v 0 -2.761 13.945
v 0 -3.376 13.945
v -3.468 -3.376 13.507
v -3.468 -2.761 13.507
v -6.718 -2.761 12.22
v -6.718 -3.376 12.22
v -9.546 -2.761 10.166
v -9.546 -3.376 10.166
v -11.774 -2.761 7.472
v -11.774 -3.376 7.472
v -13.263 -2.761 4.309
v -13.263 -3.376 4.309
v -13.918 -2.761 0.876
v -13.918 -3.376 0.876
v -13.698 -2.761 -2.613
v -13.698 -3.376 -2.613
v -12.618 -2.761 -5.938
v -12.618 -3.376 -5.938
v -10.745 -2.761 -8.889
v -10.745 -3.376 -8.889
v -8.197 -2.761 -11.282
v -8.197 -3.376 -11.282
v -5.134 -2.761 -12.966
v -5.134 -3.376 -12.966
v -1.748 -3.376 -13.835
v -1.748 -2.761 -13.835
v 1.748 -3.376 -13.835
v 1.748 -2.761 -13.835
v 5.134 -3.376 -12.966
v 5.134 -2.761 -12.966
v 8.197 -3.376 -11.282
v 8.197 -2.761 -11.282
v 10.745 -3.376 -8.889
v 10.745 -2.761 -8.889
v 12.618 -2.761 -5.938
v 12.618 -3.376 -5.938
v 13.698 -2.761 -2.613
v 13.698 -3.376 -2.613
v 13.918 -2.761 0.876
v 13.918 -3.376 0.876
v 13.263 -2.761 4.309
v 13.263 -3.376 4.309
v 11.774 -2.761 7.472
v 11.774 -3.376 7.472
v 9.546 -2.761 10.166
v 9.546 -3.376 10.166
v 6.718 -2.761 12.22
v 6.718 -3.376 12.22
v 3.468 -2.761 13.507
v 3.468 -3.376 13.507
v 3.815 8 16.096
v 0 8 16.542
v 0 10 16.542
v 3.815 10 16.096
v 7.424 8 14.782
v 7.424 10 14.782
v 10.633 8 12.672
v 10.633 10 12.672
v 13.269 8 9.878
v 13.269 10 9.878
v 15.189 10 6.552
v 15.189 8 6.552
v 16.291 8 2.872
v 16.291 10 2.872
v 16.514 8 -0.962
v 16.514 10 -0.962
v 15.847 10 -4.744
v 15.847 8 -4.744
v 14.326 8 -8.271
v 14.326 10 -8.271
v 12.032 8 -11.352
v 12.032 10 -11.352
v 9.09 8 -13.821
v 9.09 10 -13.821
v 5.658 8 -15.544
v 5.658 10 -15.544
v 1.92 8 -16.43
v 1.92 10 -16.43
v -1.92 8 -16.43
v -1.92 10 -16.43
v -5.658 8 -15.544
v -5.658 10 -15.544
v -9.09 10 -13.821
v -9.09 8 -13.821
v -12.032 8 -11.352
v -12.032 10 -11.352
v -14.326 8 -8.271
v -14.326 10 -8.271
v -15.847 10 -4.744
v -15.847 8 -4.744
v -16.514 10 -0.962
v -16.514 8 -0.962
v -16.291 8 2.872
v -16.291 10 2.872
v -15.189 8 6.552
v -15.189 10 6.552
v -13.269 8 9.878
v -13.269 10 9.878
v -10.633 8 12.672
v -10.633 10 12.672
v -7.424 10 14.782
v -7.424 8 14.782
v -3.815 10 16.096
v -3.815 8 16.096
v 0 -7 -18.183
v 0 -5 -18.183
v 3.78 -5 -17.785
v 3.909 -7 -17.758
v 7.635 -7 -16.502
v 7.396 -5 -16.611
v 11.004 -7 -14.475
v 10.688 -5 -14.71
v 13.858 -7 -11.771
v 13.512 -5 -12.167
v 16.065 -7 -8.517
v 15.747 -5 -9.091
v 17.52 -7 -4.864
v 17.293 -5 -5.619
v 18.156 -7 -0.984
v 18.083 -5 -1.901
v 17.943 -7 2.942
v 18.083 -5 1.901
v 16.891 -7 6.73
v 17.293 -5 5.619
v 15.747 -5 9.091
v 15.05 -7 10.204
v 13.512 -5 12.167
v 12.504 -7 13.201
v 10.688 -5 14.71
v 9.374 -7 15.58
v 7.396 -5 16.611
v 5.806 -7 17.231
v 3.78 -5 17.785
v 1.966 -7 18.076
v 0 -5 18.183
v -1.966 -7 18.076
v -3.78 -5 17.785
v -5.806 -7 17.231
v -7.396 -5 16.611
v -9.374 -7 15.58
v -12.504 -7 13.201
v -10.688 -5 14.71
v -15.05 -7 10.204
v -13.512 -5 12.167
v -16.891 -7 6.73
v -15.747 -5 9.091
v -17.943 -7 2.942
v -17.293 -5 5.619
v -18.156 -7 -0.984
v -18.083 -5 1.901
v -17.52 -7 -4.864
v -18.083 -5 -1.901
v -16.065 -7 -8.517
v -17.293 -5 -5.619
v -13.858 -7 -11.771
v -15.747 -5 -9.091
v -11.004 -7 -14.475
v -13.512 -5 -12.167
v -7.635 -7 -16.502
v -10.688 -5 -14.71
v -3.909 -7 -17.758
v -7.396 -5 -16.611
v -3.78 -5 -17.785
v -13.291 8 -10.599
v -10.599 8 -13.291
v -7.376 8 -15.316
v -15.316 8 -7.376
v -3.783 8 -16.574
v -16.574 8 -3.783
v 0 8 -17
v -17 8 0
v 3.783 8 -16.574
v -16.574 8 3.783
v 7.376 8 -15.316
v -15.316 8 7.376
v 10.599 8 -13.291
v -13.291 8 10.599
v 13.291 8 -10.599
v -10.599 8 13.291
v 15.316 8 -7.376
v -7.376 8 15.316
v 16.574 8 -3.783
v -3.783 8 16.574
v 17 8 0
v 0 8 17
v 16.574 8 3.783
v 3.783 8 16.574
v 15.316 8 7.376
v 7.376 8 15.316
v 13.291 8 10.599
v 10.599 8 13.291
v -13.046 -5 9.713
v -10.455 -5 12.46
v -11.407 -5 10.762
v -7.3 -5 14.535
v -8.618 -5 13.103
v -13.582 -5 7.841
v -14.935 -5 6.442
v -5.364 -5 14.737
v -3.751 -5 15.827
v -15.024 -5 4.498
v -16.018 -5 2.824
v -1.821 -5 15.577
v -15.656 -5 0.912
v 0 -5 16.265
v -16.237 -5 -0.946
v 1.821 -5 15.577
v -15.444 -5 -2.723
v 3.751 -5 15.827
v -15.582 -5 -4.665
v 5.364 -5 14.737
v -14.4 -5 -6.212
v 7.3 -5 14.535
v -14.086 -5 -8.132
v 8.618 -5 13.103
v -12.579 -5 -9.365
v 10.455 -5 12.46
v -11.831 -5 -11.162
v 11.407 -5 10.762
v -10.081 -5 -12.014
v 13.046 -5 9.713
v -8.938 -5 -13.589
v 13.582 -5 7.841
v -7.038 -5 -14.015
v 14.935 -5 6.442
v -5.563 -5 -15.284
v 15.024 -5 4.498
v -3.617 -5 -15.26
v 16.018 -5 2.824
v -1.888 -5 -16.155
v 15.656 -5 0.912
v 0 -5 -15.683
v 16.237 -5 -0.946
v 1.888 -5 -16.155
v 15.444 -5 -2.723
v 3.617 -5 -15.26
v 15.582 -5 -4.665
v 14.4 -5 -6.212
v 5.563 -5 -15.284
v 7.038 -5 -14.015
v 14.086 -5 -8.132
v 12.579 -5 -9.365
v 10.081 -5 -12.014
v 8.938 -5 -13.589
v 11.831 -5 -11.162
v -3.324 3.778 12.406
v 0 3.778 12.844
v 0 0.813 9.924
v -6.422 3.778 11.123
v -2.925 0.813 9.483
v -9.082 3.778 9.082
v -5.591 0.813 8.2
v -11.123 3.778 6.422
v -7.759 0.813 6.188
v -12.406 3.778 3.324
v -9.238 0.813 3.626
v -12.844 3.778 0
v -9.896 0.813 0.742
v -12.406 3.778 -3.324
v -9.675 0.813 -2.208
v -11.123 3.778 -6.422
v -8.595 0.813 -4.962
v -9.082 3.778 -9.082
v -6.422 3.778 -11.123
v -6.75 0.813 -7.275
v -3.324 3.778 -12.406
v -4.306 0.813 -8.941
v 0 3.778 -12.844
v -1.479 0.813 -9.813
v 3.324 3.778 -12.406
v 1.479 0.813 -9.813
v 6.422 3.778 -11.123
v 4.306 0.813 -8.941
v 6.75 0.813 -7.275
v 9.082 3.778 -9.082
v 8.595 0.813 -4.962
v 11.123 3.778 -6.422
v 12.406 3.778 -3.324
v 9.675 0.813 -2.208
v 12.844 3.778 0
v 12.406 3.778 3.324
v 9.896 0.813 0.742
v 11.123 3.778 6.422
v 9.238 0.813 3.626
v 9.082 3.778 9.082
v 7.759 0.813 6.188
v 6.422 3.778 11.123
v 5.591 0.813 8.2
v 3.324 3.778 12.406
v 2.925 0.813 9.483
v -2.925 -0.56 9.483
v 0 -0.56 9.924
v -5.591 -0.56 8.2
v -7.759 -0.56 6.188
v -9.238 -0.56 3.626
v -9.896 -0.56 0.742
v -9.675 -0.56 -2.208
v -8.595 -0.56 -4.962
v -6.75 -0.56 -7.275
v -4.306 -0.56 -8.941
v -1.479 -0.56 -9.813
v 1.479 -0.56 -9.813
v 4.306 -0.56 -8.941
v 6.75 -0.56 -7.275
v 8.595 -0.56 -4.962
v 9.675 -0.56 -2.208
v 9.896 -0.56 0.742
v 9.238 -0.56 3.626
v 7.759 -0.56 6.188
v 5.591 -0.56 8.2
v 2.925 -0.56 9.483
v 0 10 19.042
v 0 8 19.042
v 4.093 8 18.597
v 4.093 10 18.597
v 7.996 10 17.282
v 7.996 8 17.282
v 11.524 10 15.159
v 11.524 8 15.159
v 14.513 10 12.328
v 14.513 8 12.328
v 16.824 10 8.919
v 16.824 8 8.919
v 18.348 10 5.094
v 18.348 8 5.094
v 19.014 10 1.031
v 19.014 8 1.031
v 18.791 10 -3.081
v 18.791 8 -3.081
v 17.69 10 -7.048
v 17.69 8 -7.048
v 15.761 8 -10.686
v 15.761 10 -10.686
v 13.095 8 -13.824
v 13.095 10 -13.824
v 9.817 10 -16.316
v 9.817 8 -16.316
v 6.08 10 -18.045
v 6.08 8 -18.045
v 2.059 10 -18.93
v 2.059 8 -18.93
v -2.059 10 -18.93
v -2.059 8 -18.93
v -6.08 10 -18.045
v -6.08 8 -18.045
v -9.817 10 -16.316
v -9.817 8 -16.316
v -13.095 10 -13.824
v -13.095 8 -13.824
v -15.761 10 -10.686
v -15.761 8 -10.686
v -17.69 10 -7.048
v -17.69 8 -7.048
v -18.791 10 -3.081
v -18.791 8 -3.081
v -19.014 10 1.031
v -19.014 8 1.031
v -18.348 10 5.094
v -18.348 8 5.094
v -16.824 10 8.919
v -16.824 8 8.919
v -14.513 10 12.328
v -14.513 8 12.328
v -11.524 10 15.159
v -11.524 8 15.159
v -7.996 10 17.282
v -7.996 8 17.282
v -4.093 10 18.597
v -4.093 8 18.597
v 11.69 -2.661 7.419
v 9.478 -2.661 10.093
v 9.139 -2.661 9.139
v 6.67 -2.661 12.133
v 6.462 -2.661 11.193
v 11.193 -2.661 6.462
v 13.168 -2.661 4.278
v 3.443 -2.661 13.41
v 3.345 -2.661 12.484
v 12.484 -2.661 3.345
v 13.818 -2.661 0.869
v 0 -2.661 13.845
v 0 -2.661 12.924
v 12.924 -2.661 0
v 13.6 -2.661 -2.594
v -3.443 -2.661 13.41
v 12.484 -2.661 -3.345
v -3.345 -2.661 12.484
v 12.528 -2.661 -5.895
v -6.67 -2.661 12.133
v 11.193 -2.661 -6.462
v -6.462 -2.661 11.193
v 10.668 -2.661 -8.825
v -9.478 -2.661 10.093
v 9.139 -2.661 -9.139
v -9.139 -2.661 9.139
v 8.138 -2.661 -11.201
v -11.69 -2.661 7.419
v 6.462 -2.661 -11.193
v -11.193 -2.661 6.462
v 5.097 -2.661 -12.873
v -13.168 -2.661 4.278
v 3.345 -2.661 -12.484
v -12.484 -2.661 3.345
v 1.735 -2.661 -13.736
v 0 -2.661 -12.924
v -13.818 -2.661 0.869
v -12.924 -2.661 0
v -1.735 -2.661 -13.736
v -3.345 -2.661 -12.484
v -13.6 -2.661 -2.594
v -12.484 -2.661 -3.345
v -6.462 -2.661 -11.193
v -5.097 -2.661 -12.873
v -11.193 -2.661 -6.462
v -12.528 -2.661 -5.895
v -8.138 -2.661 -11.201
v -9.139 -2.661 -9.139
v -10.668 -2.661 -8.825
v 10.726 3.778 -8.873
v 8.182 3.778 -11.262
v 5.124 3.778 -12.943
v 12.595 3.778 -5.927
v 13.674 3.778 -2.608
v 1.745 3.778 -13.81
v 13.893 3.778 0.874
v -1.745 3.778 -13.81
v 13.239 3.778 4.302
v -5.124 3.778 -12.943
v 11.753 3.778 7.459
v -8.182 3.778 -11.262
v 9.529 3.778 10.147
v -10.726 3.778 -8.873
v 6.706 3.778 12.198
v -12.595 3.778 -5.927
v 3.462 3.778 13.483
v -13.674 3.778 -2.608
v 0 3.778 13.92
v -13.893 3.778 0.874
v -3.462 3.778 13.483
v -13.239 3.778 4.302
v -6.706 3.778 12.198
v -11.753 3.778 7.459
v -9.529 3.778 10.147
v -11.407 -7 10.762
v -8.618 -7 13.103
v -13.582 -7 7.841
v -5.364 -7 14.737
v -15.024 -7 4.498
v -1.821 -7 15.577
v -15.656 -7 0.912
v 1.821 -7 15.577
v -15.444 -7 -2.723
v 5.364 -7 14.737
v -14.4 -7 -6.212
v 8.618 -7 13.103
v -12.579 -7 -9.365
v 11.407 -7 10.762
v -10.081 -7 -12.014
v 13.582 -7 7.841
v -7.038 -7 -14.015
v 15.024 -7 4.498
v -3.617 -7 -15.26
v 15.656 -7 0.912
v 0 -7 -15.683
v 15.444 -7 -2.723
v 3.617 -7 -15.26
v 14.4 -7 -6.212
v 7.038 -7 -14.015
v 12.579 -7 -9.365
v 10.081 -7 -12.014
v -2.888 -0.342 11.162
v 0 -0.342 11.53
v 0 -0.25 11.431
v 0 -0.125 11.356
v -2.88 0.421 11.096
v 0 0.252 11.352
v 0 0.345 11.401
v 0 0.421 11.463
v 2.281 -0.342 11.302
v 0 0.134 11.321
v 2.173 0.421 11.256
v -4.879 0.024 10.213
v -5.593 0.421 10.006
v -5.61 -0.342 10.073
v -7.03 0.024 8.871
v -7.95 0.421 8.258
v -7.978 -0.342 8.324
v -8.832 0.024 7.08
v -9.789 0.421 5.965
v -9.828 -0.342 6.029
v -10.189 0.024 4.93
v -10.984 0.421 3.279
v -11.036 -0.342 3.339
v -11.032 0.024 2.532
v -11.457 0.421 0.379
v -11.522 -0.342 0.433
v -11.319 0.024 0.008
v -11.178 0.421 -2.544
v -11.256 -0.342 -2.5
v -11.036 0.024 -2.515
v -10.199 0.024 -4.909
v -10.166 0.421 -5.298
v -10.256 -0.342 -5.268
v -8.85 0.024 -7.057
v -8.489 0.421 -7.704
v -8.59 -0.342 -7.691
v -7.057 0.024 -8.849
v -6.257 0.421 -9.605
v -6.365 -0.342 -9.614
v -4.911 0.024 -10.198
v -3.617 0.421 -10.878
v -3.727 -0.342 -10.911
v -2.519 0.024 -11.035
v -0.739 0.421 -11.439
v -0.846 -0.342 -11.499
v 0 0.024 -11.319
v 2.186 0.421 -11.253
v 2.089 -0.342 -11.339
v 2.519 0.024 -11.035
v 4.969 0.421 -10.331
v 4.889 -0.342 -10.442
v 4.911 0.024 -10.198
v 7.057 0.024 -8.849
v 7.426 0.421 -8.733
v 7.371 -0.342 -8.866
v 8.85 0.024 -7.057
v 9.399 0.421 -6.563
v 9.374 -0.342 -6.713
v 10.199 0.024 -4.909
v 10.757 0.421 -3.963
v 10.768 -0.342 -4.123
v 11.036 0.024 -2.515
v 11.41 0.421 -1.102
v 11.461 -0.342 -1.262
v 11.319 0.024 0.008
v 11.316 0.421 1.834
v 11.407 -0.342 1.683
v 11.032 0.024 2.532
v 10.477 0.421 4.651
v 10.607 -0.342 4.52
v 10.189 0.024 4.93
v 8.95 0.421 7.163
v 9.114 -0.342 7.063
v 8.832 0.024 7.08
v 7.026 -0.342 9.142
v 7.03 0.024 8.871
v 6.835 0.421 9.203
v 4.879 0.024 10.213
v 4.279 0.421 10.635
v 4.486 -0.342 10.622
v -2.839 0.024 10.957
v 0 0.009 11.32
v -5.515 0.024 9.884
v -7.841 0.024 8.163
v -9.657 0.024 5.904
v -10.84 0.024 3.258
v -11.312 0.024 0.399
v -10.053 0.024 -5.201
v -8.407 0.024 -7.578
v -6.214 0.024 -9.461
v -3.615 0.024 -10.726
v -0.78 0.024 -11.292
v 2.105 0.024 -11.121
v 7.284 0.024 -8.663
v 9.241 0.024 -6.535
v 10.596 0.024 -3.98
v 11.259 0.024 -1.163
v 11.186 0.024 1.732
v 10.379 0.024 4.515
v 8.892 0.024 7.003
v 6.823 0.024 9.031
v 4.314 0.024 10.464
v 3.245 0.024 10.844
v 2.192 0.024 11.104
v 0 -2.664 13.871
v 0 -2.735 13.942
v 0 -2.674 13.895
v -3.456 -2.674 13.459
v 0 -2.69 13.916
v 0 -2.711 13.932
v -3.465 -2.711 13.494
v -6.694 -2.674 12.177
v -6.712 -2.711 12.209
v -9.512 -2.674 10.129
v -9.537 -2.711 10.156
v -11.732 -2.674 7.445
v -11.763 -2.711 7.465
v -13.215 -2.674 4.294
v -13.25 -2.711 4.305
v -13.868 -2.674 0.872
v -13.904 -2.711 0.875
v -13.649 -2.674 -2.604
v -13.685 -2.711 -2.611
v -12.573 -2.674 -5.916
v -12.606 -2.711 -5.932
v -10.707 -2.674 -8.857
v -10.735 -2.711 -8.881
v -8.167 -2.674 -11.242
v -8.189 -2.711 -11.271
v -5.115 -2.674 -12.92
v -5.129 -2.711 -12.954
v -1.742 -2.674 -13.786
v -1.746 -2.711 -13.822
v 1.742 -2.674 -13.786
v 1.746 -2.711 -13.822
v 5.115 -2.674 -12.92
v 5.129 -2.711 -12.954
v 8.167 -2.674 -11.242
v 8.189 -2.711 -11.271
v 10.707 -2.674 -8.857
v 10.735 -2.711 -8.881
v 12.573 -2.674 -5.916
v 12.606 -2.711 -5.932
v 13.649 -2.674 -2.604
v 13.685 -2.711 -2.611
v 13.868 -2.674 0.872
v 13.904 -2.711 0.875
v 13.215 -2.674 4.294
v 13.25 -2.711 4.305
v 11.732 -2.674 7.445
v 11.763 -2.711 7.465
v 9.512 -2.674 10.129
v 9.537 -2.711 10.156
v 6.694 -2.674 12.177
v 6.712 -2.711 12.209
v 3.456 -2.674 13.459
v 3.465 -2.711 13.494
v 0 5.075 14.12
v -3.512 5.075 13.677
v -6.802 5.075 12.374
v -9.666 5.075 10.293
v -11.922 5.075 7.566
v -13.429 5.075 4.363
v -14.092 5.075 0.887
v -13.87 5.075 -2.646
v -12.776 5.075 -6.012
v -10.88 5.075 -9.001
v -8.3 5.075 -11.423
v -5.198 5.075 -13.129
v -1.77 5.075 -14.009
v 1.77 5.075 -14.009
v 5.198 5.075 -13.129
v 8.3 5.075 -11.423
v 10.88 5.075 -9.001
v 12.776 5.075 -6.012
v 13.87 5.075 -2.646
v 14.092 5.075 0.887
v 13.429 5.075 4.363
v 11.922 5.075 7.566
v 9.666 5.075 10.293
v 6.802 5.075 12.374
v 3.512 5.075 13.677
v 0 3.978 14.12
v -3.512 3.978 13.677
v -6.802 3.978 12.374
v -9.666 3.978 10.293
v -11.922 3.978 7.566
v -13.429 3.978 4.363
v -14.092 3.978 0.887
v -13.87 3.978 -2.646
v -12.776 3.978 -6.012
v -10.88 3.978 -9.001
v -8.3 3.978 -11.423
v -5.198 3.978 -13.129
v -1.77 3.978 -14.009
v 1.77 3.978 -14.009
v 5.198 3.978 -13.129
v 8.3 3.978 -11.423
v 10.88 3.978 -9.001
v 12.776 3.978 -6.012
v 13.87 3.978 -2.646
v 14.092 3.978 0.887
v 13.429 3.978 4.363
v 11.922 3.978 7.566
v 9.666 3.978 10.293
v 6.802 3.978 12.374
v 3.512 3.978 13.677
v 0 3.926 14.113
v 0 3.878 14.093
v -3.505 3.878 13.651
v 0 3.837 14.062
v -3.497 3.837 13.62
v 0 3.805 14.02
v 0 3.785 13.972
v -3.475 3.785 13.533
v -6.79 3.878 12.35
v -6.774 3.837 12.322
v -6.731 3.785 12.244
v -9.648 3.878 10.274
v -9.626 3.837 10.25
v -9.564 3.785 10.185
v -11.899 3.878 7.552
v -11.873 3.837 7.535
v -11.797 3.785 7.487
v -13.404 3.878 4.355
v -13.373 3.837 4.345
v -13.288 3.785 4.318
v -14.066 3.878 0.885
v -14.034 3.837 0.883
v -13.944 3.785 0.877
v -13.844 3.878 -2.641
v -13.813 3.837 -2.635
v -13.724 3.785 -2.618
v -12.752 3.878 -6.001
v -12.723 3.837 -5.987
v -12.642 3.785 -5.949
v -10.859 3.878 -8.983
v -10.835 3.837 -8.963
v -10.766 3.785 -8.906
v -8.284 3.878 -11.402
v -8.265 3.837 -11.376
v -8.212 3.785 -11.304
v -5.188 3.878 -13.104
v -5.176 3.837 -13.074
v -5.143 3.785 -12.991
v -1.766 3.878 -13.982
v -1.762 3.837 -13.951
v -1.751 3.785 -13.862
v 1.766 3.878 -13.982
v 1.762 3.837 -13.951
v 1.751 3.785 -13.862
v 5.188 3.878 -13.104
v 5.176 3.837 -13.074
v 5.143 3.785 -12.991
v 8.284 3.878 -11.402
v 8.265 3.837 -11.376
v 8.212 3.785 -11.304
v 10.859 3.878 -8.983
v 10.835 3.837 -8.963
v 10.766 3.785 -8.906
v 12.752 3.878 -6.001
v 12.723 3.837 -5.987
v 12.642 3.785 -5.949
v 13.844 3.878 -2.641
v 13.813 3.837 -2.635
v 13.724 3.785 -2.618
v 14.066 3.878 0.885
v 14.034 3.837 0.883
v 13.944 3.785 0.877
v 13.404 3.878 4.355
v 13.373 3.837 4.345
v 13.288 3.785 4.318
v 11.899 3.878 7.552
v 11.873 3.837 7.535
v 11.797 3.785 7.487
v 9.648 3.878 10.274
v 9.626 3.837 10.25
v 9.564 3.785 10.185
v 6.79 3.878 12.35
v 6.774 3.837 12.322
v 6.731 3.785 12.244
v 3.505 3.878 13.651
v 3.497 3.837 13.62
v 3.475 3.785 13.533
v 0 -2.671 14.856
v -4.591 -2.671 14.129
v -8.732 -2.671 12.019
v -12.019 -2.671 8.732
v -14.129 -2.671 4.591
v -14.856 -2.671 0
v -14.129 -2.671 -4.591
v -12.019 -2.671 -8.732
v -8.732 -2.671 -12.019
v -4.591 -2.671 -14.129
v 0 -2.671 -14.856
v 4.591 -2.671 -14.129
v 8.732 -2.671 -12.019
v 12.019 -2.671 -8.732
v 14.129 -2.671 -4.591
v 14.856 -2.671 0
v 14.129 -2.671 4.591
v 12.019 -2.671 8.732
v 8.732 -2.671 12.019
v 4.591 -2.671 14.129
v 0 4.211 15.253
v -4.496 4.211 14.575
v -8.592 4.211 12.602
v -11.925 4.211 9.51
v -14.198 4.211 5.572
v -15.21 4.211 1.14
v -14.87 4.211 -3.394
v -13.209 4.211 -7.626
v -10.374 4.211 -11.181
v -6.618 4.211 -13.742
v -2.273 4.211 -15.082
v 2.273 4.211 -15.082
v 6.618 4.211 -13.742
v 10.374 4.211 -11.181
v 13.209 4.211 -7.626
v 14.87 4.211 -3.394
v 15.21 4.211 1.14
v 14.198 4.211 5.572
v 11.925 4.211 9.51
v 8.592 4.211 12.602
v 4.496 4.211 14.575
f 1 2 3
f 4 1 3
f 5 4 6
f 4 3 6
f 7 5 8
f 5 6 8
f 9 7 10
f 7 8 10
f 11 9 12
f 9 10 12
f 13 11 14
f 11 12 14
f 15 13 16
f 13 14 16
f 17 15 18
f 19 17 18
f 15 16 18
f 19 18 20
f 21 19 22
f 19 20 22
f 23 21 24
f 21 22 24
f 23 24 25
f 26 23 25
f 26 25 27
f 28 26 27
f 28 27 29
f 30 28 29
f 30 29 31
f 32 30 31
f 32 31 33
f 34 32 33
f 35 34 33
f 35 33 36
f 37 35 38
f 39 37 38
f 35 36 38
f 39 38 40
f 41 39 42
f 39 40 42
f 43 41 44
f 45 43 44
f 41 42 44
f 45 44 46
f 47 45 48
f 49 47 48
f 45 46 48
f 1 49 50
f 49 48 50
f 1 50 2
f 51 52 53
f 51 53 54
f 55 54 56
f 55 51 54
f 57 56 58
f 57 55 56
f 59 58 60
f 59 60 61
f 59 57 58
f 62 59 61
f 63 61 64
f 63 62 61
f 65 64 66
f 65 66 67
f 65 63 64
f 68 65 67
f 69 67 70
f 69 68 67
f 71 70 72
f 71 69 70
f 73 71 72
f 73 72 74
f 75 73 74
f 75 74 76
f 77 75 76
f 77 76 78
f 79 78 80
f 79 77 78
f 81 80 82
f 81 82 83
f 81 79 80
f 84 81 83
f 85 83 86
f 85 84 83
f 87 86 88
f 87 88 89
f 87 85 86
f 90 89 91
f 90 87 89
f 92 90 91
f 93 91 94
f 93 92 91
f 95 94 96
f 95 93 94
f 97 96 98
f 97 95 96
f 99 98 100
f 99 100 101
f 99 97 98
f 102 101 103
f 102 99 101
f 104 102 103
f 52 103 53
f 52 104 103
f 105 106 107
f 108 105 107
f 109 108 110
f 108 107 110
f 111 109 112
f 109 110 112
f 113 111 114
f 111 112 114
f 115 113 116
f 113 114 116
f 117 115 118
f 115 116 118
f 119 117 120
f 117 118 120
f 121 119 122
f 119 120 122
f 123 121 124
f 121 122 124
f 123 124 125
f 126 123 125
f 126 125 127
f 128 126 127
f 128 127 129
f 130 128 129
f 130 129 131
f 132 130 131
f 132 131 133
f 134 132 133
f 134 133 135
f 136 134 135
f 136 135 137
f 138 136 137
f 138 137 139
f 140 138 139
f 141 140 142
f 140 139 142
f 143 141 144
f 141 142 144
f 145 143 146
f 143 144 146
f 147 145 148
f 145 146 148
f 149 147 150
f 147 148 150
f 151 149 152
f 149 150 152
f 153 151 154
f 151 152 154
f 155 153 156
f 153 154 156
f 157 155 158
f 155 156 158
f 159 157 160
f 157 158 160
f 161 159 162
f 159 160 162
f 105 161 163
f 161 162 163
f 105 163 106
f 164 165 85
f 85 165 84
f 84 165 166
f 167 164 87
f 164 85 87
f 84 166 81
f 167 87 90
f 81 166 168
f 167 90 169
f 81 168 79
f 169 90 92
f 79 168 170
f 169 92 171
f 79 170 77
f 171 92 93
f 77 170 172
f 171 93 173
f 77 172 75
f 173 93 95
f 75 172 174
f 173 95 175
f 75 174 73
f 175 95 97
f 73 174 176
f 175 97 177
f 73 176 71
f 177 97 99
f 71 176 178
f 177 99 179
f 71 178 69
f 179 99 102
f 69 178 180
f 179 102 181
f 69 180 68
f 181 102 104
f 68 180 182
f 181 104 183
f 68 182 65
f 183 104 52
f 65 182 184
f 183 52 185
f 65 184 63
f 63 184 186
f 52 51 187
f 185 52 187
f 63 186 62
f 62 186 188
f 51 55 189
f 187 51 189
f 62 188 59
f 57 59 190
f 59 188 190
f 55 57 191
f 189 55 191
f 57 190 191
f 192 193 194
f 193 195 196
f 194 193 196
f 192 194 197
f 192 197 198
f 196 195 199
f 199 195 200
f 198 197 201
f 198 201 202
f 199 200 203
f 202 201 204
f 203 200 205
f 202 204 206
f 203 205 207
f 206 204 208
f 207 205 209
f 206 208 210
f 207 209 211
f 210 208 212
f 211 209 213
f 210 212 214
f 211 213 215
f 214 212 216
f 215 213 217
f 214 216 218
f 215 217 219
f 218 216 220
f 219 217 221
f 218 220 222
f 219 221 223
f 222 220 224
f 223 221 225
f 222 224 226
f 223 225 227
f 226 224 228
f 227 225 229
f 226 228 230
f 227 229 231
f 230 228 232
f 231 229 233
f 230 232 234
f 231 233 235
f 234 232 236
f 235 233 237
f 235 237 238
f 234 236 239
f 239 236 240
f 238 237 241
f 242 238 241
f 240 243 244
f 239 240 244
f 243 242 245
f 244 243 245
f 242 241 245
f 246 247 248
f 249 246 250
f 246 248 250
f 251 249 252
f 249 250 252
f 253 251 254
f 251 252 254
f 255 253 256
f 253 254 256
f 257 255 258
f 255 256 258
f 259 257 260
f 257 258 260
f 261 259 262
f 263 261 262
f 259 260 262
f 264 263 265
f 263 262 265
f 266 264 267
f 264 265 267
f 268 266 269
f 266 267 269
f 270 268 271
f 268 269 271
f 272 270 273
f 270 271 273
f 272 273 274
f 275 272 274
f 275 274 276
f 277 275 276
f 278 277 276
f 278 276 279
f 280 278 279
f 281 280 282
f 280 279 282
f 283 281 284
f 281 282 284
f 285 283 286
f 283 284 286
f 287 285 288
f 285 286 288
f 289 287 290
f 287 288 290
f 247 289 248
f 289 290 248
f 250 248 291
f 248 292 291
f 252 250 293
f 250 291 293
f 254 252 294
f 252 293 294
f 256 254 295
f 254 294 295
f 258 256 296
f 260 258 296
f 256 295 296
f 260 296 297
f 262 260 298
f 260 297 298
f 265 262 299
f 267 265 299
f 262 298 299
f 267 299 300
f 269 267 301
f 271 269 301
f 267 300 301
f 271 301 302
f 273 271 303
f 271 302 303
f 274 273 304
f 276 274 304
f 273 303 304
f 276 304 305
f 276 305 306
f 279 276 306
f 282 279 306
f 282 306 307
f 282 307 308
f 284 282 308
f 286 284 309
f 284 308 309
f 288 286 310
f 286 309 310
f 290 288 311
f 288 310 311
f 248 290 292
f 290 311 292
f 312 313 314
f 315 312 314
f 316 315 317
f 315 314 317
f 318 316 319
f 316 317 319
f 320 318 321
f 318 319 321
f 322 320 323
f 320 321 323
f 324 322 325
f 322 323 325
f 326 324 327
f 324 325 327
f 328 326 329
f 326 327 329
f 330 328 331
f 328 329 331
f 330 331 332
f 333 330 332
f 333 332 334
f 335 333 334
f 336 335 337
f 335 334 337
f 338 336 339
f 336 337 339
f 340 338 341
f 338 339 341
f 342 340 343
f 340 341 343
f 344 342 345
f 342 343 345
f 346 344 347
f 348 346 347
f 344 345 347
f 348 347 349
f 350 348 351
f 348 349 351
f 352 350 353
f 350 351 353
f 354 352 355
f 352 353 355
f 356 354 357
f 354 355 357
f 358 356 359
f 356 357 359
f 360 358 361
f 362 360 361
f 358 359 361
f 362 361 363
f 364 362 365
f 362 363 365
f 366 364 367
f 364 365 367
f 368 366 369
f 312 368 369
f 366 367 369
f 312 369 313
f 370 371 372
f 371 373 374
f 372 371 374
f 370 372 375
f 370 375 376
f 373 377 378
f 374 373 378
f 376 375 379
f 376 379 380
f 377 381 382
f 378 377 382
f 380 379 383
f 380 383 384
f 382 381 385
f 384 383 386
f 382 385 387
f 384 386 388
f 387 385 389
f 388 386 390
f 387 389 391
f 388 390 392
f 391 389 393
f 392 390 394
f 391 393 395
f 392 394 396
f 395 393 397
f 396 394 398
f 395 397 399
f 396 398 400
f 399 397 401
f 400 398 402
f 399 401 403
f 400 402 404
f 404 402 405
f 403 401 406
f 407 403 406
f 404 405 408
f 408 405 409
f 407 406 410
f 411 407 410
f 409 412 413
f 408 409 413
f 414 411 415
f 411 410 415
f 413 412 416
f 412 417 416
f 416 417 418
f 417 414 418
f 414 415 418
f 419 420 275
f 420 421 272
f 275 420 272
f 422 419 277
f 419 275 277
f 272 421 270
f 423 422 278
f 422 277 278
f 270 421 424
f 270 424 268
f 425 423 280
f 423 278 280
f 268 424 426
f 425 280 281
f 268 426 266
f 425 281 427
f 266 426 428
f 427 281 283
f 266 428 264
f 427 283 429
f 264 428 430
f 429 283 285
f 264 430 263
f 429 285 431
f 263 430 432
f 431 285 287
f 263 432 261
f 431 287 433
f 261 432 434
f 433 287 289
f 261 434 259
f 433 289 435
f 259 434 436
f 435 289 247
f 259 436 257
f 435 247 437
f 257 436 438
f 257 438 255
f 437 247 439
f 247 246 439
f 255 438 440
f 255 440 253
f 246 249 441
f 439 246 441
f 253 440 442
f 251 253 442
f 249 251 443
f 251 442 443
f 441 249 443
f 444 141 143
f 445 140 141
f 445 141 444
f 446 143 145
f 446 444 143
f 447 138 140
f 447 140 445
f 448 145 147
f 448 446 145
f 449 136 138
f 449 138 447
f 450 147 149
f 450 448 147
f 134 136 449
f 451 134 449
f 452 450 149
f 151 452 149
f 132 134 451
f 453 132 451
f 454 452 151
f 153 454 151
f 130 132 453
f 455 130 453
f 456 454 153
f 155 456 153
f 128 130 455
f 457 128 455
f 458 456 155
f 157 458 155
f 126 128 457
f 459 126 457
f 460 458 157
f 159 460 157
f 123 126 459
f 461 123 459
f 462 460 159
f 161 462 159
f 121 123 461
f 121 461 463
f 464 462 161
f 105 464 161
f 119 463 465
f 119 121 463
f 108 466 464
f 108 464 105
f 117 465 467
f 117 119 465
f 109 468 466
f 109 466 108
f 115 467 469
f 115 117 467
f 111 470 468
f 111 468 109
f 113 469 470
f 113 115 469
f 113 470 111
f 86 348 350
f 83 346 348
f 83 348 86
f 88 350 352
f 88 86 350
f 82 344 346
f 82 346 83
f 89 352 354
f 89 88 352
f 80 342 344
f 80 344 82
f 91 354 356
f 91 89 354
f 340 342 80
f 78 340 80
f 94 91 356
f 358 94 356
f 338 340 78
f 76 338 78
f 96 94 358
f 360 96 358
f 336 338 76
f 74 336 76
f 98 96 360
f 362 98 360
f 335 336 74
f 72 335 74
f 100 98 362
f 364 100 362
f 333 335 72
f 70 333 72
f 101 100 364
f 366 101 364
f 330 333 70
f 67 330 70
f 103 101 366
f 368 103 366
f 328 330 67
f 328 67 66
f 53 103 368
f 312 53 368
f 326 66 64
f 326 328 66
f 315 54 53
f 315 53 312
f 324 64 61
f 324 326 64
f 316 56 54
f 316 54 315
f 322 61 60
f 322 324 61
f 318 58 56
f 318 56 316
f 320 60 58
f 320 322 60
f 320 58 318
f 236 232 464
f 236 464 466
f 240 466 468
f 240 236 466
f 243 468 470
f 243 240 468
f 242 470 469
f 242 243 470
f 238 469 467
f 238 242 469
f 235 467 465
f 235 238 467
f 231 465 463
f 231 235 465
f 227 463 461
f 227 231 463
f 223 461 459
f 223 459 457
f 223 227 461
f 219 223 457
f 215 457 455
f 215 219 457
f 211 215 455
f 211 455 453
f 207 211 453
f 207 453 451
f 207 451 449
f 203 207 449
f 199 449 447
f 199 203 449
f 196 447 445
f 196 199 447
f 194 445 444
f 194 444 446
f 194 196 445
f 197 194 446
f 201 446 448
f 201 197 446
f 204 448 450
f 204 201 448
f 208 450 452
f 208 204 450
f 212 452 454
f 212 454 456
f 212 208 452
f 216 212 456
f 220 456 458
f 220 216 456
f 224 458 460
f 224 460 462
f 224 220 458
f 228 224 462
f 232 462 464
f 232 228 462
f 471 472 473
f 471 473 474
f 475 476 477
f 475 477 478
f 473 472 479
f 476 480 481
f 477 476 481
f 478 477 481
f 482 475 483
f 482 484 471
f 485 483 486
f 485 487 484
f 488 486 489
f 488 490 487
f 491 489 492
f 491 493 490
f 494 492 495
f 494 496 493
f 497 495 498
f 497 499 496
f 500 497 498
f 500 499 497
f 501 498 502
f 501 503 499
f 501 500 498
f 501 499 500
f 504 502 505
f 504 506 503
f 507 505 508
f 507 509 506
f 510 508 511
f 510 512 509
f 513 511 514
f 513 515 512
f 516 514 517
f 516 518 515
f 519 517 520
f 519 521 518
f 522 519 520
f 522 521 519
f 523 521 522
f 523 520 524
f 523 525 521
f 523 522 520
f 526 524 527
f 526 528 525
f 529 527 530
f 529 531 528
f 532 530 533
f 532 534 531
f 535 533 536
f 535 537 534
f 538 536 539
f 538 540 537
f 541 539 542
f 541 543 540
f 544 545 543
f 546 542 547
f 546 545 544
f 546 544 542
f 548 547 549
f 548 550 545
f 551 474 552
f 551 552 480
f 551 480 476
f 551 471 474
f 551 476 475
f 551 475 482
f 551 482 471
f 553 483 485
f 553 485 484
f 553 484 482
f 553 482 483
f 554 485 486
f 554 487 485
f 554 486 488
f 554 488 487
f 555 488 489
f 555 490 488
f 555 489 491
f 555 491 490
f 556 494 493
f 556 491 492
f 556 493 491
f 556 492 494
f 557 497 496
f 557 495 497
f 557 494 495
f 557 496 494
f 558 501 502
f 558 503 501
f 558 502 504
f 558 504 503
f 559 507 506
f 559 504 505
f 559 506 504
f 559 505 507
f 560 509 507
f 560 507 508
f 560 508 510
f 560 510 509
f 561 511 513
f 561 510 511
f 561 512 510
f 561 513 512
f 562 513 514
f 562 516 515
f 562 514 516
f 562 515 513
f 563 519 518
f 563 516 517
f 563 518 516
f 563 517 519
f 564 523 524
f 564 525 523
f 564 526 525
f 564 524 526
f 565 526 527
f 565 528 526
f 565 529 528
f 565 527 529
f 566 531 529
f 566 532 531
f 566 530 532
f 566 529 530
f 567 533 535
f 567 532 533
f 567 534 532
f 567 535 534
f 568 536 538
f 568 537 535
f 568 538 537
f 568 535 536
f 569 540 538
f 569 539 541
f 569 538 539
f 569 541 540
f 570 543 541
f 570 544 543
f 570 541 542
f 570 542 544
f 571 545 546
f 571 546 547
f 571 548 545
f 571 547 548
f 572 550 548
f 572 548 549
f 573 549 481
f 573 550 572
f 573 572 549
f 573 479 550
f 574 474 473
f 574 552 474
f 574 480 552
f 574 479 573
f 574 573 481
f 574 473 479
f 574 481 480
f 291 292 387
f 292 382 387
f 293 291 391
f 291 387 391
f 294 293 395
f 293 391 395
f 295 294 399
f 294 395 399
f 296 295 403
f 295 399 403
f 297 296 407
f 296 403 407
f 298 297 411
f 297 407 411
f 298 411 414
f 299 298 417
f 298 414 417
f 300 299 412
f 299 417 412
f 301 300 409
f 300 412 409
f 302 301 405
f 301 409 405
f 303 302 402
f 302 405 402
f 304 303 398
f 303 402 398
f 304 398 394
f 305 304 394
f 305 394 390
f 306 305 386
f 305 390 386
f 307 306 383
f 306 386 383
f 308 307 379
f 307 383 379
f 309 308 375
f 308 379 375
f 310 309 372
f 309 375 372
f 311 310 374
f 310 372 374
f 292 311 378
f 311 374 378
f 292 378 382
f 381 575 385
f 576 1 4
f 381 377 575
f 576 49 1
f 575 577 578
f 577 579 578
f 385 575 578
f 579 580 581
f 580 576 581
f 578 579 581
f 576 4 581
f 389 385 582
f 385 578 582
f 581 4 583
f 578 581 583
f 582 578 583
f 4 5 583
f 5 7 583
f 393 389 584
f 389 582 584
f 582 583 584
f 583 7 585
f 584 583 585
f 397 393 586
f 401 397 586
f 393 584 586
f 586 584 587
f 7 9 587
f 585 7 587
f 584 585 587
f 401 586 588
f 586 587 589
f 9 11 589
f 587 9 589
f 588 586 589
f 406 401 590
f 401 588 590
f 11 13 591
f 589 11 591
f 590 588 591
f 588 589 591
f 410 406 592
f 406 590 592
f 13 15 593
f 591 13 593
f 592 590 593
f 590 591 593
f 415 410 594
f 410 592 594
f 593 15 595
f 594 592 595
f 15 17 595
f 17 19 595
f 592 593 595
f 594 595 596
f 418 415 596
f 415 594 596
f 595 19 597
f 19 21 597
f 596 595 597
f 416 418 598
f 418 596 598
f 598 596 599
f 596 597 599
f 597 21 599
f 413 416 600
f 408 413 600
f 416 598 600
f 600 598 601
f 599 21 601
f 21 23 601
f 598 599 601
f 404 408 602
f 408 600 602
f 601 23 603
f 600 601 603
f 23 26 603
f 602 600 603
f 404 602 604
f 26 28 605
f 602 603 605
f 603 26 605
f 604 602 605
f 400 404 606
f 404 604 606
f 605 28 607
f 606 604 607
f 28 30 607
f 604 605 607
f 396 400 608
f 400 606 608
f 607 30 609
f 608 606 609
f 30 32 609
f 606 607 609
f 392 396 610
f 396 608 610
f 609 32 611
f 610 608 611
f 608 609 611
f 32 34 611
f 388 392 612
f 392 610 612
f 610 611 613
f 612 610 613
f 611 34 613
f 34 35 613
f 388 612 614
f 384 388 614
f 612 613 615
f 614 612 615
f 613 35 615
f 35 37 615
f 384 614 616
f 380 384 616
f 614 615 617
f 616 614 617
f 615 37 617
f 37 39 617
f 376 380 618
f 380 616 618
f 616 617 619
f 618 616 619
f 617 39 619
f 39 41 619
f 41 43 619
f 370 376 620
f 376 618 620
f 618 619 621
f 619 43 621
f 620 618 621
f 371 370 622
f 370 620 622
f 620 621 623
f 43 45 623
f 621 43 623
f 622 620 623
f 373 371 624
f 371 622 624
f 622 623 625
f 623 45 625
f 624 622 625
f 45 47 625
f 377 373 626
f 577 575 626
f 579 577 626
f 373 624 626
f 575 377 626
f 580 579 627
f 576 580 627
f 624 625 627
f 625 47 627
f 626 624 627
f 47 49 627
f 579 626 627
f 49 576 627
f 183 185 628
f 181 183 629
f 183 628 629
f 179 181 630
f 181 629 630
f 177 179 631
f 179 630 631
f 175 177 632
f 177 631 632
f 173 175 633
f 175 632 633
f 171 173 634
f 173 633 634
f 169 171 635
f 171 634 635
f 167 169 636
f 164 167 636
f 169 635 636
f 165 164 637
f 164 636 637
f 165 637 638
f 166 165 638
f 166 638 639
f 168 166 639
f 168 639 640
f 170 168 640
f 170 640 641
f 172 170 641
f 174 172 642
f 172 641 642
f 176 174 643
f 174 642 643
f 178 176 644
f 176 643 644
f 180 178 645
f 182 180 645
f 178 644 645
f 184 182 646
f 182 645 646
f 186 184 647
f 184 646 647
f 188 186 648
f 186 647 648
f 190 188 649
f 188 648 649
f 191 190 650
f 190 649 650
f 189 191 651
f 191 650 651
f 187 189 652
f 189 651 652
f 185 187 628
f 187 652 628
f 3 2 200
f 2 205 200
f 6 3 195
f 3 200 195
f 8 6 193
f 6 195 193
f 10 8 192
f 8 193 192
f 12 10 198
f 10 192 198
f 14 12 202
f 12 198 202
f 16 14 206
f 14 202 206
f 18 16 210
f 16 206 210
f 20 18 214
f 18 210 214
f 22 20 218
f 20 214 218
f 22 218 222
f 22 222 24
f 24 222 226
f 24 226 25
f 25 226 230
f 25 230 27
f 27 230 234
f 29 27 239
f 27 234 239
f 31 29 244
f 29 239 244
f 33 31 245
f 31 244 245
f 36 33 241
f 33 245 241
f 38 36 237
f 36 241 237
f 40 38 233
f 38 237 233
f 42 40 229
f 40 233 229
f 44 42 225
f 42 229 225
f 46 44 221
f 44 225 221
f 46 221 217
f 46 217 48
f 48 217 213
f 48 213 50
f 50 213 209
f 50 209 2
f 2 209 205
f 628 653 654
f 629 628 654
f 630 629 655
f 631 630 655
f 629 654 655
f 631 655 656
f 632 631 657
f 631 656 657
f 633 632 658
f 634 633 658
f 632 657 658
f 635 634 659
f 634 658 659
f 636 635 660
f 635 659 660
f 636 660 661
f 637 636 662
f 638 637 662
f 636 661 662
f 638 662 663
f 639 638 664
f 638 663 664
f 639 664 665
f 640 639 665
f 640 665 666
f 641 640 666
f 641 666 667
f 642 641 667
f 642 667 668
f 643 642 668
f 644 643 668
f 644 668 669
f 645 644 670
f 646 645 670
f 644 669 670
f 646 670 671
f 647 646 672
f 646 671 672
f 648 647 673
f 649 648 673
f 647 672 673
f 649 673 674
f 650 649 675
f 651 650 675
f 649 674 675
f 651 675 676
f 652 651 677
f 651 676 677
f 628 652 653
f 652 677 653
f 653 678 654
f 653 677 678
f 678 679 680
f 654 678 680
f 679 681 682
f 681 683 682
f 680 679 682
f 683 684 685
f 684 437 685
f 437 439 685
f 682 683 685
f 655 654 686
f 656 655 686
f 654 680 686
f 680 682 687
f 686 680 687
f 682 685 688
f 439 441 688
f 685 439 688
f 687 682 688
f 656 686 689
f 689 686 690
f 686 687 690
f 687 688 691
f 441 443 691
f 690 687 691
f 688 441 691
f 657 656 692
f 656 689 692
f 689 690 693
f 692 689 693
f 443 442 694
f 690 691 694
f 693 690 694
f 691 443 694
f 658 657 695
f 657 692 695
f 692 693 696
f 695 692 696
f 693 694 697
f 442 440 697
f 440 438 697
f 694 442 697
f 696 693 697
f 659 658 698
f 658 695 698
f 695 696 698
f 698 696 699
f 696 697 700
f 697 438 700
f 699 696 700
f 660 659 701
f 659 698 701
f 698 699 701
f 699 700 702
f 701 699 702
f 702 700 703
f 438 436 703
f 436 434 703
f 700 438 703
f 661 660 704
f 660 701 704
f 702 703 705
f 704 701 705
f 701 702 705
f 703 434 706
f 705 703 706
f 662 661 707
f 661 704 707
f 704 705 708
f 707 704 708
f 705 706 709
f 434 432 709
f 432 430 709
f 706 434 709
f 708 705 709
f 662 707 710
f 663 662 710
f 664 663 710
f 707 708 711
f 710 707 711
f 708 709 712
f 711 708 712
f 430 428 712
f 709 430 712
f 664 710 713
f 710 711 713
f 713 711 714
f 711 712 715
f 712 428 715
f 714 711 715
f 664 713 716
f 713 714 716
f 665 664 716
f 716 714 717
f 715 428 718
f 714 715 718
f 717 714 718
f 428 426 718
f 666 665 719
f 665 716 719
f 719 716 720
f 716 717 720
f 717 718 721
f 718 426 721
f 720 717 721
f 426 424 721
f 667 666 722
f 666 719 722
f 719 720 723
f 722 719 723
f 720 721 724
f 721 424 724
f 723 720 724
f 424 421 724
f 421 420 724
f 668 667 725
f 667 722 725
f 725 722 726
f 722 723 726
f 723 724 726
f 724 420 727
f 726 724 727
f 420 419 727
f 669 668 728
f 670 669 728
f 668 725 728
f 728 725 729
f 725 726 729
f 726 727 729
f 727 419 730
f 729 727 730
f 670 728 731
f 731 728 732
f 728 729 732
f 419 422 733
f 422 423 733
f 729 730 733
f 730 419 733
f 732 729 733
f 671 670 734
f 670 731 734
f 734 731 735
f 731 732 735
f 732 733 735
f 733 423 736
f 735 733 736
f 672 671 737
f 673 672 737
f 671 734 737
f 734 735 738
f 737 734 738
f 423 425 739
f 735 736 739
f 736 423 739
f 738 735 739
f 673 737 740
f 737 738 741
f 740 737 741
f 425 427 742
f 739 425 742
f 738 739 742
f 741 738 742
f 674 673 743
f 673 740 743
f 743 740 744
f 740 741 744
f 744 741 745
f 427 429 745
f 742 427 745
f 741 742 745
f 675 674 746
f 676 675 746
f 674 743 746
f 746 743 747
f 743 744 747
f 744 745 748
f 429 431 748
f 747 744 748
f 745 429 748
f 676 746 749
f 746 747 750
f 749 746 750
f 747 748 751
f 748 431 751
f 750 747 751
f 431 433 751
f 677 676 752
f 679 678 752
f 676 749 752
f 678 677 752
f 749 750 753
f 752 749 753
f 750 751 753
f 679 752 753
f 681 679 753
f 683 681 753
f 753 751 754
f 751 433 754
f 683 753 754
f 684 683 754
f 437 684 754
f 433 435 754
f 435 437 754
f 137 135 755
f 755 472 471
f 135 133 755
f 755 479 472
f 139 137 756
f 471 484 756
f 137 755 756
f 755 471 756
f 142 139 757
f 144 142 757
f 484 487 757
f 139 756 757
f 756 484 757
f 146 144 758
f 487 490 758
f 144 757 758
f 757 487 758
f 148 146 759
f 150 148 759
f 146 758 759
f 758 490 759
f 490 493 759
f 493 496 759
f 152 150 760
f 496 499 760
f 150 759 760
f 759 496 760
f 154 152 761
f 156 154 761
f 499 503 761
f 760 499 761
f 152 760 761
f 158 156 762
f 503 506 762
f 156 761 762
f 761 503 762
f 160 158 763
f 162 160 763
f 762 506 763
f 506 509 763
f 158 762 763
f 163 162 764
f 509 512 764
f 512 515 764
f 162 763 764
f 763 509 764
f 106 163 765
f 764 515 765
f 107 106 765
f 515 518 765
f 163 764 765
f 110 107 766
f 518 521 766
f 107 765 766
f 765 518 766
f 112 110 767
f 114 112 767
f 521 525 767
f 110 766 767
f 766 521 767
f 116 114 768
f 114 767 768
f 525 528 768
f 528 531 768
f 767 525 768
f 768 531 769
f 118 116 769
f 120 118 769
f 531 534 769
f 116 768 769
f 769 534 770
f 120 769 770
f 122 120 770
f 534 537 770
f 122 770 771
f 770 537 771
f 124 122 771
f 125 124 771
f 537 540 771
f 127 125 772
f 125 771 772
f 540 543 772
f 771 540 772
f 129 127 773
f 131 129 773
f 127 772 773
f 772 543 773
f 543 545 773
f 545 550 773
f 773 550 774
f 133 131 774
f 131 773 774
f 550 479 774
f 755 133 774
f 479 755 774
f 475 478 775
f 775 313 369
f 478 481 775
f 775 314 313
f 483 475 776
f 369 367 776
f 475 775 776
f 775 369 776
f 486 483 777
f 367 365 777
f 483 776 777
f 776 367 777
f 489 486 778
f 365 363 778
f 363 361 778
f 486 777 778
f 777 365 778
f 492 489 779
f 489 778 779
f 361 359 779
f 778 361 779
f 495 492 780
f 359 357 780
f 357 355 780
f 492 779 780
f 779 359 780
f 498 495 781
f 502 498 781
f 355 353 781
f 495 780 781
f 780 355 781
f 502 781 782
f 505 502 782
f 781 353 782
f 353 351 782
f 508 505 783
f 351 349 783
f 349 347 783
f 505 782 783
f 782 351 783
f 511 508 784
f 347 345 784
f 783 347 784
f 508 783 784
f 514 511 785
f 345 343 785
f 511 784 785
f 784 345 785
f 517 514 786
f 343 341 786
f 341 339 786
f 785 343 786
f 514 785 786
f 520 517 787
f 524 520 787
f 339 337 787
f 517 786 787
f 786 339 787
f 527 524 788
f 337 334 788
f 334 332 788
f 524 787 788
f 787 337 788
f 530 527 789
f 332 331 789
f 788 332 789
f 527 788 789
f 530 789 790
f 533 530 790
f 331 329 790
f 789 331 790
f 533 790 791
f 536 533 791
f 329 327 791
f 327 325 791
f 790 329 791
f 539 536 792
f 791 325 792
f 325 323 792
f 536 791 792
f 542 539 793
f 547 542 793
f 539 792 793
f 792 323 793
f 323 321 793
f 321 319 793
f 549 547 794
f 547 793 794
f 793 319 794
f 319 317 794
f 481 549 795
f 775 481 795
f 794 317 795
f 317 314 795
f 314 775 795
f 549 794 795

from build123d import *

# Parameters (mm, degrees)
FILLET3_R           = 0.2
FILLET5_R           = 0.1
SKETCH2_R           = 19.042006499
SKETCH2_R_2         = 16.542006499
BOSS_EXTRUDE1_DEPTH = 2
SKETCH3_R           = 18.182746533
SKETCH3_R_2         = 15.682746533
BOSS_EXTRUDE2_DEPTH = 2
MIDDLE_FILLLET_R    = 0.5


with BuildPart() as part:
    # Sketch1 → Revolve1 (revolve)
    with BuildSketch(Plane.XY, mode=Mode.PRIVATE) as revolve1_sk:
        Polygon((-17, 8), (-14.120151906, 5.074731621), (-14.120151906, 3.778145407), (-12.843697628, 3.778145407), (-9.924215024, 0.812617411), (-9.924215024, -0.560166031), (-12.924215024, -2.660788645), (-13.945322255, -2.660788645), (-13.945322255, -3.375775626), (-16.264955058, -5), (-18.182746533, -5), (-11.042006499, 0), (-19.042006499, 8), align=None)
    revolve(revolve1_sk.sketch.rotate(Axis((0, 30.18306827, 0), (0, -1, 0)), 270), axis=Axis((0, 30.18306827, 0), (0, -1, 0)))

    # Fillet3
    fillet3_edges = [part.edges().sort_by_distance(p)[0] for p in [
        (0, 3.778145407, -14.120151906),
    ]]
    fillet(fillet3_edges, radius=FILLET3_R)

    # Fillet5
    fillet5_edges = [part.edges().sort_by_distance(p)[0] for p in [
        (0, -2.660788645, -13.945322255),
    ]]
    fillet(fillet5_edges, radius=FILLET5_R)

    # Sketch2 → Boss-Extrude1 (add)
    with BuildSketch(Plane(origin=(0, 8, 0), x_dir=(1, 0, 0), z_dir=(0, 1, 0))):
        with Locations(Location((0, 0, 0), (0, 0, 270))):
            Circle(SKETCH2_R)
        with Locations(Location((0, 0, 0), (0, 0, 270))):
            Circle(SKETCH2_R_2, mode=Mode.SUBTRACT)
    extrude(amount=BOSS_EXTRUDE1_DEPTH)

    # Sketch3 → Boss-Extrude2 (add)
    with BuildSketch(Plane.XZ.offset(5)):
        with Locations(Location((0, 0, 0), (0, 0, 270))):
            Circle(SKETCH3_R)
        with Locations(Location((0, 0, 0), (0, 0, 270))):
            Circle(SKETCH3_R_2, mode=Mode.SUBTRACT)
    extrude(amount=BOSS_EXTRUDE2_DEPTH)

    # middle_filllet
    middle_filllet_edges = [part.edges().sort_by_distance(p)[0] for p in [
        (0, 0, -11.042006499),
    ]]
    fillet(middle_filllet_edges, radius=MIDDLE_FILLLET_R)


solid = part.part
